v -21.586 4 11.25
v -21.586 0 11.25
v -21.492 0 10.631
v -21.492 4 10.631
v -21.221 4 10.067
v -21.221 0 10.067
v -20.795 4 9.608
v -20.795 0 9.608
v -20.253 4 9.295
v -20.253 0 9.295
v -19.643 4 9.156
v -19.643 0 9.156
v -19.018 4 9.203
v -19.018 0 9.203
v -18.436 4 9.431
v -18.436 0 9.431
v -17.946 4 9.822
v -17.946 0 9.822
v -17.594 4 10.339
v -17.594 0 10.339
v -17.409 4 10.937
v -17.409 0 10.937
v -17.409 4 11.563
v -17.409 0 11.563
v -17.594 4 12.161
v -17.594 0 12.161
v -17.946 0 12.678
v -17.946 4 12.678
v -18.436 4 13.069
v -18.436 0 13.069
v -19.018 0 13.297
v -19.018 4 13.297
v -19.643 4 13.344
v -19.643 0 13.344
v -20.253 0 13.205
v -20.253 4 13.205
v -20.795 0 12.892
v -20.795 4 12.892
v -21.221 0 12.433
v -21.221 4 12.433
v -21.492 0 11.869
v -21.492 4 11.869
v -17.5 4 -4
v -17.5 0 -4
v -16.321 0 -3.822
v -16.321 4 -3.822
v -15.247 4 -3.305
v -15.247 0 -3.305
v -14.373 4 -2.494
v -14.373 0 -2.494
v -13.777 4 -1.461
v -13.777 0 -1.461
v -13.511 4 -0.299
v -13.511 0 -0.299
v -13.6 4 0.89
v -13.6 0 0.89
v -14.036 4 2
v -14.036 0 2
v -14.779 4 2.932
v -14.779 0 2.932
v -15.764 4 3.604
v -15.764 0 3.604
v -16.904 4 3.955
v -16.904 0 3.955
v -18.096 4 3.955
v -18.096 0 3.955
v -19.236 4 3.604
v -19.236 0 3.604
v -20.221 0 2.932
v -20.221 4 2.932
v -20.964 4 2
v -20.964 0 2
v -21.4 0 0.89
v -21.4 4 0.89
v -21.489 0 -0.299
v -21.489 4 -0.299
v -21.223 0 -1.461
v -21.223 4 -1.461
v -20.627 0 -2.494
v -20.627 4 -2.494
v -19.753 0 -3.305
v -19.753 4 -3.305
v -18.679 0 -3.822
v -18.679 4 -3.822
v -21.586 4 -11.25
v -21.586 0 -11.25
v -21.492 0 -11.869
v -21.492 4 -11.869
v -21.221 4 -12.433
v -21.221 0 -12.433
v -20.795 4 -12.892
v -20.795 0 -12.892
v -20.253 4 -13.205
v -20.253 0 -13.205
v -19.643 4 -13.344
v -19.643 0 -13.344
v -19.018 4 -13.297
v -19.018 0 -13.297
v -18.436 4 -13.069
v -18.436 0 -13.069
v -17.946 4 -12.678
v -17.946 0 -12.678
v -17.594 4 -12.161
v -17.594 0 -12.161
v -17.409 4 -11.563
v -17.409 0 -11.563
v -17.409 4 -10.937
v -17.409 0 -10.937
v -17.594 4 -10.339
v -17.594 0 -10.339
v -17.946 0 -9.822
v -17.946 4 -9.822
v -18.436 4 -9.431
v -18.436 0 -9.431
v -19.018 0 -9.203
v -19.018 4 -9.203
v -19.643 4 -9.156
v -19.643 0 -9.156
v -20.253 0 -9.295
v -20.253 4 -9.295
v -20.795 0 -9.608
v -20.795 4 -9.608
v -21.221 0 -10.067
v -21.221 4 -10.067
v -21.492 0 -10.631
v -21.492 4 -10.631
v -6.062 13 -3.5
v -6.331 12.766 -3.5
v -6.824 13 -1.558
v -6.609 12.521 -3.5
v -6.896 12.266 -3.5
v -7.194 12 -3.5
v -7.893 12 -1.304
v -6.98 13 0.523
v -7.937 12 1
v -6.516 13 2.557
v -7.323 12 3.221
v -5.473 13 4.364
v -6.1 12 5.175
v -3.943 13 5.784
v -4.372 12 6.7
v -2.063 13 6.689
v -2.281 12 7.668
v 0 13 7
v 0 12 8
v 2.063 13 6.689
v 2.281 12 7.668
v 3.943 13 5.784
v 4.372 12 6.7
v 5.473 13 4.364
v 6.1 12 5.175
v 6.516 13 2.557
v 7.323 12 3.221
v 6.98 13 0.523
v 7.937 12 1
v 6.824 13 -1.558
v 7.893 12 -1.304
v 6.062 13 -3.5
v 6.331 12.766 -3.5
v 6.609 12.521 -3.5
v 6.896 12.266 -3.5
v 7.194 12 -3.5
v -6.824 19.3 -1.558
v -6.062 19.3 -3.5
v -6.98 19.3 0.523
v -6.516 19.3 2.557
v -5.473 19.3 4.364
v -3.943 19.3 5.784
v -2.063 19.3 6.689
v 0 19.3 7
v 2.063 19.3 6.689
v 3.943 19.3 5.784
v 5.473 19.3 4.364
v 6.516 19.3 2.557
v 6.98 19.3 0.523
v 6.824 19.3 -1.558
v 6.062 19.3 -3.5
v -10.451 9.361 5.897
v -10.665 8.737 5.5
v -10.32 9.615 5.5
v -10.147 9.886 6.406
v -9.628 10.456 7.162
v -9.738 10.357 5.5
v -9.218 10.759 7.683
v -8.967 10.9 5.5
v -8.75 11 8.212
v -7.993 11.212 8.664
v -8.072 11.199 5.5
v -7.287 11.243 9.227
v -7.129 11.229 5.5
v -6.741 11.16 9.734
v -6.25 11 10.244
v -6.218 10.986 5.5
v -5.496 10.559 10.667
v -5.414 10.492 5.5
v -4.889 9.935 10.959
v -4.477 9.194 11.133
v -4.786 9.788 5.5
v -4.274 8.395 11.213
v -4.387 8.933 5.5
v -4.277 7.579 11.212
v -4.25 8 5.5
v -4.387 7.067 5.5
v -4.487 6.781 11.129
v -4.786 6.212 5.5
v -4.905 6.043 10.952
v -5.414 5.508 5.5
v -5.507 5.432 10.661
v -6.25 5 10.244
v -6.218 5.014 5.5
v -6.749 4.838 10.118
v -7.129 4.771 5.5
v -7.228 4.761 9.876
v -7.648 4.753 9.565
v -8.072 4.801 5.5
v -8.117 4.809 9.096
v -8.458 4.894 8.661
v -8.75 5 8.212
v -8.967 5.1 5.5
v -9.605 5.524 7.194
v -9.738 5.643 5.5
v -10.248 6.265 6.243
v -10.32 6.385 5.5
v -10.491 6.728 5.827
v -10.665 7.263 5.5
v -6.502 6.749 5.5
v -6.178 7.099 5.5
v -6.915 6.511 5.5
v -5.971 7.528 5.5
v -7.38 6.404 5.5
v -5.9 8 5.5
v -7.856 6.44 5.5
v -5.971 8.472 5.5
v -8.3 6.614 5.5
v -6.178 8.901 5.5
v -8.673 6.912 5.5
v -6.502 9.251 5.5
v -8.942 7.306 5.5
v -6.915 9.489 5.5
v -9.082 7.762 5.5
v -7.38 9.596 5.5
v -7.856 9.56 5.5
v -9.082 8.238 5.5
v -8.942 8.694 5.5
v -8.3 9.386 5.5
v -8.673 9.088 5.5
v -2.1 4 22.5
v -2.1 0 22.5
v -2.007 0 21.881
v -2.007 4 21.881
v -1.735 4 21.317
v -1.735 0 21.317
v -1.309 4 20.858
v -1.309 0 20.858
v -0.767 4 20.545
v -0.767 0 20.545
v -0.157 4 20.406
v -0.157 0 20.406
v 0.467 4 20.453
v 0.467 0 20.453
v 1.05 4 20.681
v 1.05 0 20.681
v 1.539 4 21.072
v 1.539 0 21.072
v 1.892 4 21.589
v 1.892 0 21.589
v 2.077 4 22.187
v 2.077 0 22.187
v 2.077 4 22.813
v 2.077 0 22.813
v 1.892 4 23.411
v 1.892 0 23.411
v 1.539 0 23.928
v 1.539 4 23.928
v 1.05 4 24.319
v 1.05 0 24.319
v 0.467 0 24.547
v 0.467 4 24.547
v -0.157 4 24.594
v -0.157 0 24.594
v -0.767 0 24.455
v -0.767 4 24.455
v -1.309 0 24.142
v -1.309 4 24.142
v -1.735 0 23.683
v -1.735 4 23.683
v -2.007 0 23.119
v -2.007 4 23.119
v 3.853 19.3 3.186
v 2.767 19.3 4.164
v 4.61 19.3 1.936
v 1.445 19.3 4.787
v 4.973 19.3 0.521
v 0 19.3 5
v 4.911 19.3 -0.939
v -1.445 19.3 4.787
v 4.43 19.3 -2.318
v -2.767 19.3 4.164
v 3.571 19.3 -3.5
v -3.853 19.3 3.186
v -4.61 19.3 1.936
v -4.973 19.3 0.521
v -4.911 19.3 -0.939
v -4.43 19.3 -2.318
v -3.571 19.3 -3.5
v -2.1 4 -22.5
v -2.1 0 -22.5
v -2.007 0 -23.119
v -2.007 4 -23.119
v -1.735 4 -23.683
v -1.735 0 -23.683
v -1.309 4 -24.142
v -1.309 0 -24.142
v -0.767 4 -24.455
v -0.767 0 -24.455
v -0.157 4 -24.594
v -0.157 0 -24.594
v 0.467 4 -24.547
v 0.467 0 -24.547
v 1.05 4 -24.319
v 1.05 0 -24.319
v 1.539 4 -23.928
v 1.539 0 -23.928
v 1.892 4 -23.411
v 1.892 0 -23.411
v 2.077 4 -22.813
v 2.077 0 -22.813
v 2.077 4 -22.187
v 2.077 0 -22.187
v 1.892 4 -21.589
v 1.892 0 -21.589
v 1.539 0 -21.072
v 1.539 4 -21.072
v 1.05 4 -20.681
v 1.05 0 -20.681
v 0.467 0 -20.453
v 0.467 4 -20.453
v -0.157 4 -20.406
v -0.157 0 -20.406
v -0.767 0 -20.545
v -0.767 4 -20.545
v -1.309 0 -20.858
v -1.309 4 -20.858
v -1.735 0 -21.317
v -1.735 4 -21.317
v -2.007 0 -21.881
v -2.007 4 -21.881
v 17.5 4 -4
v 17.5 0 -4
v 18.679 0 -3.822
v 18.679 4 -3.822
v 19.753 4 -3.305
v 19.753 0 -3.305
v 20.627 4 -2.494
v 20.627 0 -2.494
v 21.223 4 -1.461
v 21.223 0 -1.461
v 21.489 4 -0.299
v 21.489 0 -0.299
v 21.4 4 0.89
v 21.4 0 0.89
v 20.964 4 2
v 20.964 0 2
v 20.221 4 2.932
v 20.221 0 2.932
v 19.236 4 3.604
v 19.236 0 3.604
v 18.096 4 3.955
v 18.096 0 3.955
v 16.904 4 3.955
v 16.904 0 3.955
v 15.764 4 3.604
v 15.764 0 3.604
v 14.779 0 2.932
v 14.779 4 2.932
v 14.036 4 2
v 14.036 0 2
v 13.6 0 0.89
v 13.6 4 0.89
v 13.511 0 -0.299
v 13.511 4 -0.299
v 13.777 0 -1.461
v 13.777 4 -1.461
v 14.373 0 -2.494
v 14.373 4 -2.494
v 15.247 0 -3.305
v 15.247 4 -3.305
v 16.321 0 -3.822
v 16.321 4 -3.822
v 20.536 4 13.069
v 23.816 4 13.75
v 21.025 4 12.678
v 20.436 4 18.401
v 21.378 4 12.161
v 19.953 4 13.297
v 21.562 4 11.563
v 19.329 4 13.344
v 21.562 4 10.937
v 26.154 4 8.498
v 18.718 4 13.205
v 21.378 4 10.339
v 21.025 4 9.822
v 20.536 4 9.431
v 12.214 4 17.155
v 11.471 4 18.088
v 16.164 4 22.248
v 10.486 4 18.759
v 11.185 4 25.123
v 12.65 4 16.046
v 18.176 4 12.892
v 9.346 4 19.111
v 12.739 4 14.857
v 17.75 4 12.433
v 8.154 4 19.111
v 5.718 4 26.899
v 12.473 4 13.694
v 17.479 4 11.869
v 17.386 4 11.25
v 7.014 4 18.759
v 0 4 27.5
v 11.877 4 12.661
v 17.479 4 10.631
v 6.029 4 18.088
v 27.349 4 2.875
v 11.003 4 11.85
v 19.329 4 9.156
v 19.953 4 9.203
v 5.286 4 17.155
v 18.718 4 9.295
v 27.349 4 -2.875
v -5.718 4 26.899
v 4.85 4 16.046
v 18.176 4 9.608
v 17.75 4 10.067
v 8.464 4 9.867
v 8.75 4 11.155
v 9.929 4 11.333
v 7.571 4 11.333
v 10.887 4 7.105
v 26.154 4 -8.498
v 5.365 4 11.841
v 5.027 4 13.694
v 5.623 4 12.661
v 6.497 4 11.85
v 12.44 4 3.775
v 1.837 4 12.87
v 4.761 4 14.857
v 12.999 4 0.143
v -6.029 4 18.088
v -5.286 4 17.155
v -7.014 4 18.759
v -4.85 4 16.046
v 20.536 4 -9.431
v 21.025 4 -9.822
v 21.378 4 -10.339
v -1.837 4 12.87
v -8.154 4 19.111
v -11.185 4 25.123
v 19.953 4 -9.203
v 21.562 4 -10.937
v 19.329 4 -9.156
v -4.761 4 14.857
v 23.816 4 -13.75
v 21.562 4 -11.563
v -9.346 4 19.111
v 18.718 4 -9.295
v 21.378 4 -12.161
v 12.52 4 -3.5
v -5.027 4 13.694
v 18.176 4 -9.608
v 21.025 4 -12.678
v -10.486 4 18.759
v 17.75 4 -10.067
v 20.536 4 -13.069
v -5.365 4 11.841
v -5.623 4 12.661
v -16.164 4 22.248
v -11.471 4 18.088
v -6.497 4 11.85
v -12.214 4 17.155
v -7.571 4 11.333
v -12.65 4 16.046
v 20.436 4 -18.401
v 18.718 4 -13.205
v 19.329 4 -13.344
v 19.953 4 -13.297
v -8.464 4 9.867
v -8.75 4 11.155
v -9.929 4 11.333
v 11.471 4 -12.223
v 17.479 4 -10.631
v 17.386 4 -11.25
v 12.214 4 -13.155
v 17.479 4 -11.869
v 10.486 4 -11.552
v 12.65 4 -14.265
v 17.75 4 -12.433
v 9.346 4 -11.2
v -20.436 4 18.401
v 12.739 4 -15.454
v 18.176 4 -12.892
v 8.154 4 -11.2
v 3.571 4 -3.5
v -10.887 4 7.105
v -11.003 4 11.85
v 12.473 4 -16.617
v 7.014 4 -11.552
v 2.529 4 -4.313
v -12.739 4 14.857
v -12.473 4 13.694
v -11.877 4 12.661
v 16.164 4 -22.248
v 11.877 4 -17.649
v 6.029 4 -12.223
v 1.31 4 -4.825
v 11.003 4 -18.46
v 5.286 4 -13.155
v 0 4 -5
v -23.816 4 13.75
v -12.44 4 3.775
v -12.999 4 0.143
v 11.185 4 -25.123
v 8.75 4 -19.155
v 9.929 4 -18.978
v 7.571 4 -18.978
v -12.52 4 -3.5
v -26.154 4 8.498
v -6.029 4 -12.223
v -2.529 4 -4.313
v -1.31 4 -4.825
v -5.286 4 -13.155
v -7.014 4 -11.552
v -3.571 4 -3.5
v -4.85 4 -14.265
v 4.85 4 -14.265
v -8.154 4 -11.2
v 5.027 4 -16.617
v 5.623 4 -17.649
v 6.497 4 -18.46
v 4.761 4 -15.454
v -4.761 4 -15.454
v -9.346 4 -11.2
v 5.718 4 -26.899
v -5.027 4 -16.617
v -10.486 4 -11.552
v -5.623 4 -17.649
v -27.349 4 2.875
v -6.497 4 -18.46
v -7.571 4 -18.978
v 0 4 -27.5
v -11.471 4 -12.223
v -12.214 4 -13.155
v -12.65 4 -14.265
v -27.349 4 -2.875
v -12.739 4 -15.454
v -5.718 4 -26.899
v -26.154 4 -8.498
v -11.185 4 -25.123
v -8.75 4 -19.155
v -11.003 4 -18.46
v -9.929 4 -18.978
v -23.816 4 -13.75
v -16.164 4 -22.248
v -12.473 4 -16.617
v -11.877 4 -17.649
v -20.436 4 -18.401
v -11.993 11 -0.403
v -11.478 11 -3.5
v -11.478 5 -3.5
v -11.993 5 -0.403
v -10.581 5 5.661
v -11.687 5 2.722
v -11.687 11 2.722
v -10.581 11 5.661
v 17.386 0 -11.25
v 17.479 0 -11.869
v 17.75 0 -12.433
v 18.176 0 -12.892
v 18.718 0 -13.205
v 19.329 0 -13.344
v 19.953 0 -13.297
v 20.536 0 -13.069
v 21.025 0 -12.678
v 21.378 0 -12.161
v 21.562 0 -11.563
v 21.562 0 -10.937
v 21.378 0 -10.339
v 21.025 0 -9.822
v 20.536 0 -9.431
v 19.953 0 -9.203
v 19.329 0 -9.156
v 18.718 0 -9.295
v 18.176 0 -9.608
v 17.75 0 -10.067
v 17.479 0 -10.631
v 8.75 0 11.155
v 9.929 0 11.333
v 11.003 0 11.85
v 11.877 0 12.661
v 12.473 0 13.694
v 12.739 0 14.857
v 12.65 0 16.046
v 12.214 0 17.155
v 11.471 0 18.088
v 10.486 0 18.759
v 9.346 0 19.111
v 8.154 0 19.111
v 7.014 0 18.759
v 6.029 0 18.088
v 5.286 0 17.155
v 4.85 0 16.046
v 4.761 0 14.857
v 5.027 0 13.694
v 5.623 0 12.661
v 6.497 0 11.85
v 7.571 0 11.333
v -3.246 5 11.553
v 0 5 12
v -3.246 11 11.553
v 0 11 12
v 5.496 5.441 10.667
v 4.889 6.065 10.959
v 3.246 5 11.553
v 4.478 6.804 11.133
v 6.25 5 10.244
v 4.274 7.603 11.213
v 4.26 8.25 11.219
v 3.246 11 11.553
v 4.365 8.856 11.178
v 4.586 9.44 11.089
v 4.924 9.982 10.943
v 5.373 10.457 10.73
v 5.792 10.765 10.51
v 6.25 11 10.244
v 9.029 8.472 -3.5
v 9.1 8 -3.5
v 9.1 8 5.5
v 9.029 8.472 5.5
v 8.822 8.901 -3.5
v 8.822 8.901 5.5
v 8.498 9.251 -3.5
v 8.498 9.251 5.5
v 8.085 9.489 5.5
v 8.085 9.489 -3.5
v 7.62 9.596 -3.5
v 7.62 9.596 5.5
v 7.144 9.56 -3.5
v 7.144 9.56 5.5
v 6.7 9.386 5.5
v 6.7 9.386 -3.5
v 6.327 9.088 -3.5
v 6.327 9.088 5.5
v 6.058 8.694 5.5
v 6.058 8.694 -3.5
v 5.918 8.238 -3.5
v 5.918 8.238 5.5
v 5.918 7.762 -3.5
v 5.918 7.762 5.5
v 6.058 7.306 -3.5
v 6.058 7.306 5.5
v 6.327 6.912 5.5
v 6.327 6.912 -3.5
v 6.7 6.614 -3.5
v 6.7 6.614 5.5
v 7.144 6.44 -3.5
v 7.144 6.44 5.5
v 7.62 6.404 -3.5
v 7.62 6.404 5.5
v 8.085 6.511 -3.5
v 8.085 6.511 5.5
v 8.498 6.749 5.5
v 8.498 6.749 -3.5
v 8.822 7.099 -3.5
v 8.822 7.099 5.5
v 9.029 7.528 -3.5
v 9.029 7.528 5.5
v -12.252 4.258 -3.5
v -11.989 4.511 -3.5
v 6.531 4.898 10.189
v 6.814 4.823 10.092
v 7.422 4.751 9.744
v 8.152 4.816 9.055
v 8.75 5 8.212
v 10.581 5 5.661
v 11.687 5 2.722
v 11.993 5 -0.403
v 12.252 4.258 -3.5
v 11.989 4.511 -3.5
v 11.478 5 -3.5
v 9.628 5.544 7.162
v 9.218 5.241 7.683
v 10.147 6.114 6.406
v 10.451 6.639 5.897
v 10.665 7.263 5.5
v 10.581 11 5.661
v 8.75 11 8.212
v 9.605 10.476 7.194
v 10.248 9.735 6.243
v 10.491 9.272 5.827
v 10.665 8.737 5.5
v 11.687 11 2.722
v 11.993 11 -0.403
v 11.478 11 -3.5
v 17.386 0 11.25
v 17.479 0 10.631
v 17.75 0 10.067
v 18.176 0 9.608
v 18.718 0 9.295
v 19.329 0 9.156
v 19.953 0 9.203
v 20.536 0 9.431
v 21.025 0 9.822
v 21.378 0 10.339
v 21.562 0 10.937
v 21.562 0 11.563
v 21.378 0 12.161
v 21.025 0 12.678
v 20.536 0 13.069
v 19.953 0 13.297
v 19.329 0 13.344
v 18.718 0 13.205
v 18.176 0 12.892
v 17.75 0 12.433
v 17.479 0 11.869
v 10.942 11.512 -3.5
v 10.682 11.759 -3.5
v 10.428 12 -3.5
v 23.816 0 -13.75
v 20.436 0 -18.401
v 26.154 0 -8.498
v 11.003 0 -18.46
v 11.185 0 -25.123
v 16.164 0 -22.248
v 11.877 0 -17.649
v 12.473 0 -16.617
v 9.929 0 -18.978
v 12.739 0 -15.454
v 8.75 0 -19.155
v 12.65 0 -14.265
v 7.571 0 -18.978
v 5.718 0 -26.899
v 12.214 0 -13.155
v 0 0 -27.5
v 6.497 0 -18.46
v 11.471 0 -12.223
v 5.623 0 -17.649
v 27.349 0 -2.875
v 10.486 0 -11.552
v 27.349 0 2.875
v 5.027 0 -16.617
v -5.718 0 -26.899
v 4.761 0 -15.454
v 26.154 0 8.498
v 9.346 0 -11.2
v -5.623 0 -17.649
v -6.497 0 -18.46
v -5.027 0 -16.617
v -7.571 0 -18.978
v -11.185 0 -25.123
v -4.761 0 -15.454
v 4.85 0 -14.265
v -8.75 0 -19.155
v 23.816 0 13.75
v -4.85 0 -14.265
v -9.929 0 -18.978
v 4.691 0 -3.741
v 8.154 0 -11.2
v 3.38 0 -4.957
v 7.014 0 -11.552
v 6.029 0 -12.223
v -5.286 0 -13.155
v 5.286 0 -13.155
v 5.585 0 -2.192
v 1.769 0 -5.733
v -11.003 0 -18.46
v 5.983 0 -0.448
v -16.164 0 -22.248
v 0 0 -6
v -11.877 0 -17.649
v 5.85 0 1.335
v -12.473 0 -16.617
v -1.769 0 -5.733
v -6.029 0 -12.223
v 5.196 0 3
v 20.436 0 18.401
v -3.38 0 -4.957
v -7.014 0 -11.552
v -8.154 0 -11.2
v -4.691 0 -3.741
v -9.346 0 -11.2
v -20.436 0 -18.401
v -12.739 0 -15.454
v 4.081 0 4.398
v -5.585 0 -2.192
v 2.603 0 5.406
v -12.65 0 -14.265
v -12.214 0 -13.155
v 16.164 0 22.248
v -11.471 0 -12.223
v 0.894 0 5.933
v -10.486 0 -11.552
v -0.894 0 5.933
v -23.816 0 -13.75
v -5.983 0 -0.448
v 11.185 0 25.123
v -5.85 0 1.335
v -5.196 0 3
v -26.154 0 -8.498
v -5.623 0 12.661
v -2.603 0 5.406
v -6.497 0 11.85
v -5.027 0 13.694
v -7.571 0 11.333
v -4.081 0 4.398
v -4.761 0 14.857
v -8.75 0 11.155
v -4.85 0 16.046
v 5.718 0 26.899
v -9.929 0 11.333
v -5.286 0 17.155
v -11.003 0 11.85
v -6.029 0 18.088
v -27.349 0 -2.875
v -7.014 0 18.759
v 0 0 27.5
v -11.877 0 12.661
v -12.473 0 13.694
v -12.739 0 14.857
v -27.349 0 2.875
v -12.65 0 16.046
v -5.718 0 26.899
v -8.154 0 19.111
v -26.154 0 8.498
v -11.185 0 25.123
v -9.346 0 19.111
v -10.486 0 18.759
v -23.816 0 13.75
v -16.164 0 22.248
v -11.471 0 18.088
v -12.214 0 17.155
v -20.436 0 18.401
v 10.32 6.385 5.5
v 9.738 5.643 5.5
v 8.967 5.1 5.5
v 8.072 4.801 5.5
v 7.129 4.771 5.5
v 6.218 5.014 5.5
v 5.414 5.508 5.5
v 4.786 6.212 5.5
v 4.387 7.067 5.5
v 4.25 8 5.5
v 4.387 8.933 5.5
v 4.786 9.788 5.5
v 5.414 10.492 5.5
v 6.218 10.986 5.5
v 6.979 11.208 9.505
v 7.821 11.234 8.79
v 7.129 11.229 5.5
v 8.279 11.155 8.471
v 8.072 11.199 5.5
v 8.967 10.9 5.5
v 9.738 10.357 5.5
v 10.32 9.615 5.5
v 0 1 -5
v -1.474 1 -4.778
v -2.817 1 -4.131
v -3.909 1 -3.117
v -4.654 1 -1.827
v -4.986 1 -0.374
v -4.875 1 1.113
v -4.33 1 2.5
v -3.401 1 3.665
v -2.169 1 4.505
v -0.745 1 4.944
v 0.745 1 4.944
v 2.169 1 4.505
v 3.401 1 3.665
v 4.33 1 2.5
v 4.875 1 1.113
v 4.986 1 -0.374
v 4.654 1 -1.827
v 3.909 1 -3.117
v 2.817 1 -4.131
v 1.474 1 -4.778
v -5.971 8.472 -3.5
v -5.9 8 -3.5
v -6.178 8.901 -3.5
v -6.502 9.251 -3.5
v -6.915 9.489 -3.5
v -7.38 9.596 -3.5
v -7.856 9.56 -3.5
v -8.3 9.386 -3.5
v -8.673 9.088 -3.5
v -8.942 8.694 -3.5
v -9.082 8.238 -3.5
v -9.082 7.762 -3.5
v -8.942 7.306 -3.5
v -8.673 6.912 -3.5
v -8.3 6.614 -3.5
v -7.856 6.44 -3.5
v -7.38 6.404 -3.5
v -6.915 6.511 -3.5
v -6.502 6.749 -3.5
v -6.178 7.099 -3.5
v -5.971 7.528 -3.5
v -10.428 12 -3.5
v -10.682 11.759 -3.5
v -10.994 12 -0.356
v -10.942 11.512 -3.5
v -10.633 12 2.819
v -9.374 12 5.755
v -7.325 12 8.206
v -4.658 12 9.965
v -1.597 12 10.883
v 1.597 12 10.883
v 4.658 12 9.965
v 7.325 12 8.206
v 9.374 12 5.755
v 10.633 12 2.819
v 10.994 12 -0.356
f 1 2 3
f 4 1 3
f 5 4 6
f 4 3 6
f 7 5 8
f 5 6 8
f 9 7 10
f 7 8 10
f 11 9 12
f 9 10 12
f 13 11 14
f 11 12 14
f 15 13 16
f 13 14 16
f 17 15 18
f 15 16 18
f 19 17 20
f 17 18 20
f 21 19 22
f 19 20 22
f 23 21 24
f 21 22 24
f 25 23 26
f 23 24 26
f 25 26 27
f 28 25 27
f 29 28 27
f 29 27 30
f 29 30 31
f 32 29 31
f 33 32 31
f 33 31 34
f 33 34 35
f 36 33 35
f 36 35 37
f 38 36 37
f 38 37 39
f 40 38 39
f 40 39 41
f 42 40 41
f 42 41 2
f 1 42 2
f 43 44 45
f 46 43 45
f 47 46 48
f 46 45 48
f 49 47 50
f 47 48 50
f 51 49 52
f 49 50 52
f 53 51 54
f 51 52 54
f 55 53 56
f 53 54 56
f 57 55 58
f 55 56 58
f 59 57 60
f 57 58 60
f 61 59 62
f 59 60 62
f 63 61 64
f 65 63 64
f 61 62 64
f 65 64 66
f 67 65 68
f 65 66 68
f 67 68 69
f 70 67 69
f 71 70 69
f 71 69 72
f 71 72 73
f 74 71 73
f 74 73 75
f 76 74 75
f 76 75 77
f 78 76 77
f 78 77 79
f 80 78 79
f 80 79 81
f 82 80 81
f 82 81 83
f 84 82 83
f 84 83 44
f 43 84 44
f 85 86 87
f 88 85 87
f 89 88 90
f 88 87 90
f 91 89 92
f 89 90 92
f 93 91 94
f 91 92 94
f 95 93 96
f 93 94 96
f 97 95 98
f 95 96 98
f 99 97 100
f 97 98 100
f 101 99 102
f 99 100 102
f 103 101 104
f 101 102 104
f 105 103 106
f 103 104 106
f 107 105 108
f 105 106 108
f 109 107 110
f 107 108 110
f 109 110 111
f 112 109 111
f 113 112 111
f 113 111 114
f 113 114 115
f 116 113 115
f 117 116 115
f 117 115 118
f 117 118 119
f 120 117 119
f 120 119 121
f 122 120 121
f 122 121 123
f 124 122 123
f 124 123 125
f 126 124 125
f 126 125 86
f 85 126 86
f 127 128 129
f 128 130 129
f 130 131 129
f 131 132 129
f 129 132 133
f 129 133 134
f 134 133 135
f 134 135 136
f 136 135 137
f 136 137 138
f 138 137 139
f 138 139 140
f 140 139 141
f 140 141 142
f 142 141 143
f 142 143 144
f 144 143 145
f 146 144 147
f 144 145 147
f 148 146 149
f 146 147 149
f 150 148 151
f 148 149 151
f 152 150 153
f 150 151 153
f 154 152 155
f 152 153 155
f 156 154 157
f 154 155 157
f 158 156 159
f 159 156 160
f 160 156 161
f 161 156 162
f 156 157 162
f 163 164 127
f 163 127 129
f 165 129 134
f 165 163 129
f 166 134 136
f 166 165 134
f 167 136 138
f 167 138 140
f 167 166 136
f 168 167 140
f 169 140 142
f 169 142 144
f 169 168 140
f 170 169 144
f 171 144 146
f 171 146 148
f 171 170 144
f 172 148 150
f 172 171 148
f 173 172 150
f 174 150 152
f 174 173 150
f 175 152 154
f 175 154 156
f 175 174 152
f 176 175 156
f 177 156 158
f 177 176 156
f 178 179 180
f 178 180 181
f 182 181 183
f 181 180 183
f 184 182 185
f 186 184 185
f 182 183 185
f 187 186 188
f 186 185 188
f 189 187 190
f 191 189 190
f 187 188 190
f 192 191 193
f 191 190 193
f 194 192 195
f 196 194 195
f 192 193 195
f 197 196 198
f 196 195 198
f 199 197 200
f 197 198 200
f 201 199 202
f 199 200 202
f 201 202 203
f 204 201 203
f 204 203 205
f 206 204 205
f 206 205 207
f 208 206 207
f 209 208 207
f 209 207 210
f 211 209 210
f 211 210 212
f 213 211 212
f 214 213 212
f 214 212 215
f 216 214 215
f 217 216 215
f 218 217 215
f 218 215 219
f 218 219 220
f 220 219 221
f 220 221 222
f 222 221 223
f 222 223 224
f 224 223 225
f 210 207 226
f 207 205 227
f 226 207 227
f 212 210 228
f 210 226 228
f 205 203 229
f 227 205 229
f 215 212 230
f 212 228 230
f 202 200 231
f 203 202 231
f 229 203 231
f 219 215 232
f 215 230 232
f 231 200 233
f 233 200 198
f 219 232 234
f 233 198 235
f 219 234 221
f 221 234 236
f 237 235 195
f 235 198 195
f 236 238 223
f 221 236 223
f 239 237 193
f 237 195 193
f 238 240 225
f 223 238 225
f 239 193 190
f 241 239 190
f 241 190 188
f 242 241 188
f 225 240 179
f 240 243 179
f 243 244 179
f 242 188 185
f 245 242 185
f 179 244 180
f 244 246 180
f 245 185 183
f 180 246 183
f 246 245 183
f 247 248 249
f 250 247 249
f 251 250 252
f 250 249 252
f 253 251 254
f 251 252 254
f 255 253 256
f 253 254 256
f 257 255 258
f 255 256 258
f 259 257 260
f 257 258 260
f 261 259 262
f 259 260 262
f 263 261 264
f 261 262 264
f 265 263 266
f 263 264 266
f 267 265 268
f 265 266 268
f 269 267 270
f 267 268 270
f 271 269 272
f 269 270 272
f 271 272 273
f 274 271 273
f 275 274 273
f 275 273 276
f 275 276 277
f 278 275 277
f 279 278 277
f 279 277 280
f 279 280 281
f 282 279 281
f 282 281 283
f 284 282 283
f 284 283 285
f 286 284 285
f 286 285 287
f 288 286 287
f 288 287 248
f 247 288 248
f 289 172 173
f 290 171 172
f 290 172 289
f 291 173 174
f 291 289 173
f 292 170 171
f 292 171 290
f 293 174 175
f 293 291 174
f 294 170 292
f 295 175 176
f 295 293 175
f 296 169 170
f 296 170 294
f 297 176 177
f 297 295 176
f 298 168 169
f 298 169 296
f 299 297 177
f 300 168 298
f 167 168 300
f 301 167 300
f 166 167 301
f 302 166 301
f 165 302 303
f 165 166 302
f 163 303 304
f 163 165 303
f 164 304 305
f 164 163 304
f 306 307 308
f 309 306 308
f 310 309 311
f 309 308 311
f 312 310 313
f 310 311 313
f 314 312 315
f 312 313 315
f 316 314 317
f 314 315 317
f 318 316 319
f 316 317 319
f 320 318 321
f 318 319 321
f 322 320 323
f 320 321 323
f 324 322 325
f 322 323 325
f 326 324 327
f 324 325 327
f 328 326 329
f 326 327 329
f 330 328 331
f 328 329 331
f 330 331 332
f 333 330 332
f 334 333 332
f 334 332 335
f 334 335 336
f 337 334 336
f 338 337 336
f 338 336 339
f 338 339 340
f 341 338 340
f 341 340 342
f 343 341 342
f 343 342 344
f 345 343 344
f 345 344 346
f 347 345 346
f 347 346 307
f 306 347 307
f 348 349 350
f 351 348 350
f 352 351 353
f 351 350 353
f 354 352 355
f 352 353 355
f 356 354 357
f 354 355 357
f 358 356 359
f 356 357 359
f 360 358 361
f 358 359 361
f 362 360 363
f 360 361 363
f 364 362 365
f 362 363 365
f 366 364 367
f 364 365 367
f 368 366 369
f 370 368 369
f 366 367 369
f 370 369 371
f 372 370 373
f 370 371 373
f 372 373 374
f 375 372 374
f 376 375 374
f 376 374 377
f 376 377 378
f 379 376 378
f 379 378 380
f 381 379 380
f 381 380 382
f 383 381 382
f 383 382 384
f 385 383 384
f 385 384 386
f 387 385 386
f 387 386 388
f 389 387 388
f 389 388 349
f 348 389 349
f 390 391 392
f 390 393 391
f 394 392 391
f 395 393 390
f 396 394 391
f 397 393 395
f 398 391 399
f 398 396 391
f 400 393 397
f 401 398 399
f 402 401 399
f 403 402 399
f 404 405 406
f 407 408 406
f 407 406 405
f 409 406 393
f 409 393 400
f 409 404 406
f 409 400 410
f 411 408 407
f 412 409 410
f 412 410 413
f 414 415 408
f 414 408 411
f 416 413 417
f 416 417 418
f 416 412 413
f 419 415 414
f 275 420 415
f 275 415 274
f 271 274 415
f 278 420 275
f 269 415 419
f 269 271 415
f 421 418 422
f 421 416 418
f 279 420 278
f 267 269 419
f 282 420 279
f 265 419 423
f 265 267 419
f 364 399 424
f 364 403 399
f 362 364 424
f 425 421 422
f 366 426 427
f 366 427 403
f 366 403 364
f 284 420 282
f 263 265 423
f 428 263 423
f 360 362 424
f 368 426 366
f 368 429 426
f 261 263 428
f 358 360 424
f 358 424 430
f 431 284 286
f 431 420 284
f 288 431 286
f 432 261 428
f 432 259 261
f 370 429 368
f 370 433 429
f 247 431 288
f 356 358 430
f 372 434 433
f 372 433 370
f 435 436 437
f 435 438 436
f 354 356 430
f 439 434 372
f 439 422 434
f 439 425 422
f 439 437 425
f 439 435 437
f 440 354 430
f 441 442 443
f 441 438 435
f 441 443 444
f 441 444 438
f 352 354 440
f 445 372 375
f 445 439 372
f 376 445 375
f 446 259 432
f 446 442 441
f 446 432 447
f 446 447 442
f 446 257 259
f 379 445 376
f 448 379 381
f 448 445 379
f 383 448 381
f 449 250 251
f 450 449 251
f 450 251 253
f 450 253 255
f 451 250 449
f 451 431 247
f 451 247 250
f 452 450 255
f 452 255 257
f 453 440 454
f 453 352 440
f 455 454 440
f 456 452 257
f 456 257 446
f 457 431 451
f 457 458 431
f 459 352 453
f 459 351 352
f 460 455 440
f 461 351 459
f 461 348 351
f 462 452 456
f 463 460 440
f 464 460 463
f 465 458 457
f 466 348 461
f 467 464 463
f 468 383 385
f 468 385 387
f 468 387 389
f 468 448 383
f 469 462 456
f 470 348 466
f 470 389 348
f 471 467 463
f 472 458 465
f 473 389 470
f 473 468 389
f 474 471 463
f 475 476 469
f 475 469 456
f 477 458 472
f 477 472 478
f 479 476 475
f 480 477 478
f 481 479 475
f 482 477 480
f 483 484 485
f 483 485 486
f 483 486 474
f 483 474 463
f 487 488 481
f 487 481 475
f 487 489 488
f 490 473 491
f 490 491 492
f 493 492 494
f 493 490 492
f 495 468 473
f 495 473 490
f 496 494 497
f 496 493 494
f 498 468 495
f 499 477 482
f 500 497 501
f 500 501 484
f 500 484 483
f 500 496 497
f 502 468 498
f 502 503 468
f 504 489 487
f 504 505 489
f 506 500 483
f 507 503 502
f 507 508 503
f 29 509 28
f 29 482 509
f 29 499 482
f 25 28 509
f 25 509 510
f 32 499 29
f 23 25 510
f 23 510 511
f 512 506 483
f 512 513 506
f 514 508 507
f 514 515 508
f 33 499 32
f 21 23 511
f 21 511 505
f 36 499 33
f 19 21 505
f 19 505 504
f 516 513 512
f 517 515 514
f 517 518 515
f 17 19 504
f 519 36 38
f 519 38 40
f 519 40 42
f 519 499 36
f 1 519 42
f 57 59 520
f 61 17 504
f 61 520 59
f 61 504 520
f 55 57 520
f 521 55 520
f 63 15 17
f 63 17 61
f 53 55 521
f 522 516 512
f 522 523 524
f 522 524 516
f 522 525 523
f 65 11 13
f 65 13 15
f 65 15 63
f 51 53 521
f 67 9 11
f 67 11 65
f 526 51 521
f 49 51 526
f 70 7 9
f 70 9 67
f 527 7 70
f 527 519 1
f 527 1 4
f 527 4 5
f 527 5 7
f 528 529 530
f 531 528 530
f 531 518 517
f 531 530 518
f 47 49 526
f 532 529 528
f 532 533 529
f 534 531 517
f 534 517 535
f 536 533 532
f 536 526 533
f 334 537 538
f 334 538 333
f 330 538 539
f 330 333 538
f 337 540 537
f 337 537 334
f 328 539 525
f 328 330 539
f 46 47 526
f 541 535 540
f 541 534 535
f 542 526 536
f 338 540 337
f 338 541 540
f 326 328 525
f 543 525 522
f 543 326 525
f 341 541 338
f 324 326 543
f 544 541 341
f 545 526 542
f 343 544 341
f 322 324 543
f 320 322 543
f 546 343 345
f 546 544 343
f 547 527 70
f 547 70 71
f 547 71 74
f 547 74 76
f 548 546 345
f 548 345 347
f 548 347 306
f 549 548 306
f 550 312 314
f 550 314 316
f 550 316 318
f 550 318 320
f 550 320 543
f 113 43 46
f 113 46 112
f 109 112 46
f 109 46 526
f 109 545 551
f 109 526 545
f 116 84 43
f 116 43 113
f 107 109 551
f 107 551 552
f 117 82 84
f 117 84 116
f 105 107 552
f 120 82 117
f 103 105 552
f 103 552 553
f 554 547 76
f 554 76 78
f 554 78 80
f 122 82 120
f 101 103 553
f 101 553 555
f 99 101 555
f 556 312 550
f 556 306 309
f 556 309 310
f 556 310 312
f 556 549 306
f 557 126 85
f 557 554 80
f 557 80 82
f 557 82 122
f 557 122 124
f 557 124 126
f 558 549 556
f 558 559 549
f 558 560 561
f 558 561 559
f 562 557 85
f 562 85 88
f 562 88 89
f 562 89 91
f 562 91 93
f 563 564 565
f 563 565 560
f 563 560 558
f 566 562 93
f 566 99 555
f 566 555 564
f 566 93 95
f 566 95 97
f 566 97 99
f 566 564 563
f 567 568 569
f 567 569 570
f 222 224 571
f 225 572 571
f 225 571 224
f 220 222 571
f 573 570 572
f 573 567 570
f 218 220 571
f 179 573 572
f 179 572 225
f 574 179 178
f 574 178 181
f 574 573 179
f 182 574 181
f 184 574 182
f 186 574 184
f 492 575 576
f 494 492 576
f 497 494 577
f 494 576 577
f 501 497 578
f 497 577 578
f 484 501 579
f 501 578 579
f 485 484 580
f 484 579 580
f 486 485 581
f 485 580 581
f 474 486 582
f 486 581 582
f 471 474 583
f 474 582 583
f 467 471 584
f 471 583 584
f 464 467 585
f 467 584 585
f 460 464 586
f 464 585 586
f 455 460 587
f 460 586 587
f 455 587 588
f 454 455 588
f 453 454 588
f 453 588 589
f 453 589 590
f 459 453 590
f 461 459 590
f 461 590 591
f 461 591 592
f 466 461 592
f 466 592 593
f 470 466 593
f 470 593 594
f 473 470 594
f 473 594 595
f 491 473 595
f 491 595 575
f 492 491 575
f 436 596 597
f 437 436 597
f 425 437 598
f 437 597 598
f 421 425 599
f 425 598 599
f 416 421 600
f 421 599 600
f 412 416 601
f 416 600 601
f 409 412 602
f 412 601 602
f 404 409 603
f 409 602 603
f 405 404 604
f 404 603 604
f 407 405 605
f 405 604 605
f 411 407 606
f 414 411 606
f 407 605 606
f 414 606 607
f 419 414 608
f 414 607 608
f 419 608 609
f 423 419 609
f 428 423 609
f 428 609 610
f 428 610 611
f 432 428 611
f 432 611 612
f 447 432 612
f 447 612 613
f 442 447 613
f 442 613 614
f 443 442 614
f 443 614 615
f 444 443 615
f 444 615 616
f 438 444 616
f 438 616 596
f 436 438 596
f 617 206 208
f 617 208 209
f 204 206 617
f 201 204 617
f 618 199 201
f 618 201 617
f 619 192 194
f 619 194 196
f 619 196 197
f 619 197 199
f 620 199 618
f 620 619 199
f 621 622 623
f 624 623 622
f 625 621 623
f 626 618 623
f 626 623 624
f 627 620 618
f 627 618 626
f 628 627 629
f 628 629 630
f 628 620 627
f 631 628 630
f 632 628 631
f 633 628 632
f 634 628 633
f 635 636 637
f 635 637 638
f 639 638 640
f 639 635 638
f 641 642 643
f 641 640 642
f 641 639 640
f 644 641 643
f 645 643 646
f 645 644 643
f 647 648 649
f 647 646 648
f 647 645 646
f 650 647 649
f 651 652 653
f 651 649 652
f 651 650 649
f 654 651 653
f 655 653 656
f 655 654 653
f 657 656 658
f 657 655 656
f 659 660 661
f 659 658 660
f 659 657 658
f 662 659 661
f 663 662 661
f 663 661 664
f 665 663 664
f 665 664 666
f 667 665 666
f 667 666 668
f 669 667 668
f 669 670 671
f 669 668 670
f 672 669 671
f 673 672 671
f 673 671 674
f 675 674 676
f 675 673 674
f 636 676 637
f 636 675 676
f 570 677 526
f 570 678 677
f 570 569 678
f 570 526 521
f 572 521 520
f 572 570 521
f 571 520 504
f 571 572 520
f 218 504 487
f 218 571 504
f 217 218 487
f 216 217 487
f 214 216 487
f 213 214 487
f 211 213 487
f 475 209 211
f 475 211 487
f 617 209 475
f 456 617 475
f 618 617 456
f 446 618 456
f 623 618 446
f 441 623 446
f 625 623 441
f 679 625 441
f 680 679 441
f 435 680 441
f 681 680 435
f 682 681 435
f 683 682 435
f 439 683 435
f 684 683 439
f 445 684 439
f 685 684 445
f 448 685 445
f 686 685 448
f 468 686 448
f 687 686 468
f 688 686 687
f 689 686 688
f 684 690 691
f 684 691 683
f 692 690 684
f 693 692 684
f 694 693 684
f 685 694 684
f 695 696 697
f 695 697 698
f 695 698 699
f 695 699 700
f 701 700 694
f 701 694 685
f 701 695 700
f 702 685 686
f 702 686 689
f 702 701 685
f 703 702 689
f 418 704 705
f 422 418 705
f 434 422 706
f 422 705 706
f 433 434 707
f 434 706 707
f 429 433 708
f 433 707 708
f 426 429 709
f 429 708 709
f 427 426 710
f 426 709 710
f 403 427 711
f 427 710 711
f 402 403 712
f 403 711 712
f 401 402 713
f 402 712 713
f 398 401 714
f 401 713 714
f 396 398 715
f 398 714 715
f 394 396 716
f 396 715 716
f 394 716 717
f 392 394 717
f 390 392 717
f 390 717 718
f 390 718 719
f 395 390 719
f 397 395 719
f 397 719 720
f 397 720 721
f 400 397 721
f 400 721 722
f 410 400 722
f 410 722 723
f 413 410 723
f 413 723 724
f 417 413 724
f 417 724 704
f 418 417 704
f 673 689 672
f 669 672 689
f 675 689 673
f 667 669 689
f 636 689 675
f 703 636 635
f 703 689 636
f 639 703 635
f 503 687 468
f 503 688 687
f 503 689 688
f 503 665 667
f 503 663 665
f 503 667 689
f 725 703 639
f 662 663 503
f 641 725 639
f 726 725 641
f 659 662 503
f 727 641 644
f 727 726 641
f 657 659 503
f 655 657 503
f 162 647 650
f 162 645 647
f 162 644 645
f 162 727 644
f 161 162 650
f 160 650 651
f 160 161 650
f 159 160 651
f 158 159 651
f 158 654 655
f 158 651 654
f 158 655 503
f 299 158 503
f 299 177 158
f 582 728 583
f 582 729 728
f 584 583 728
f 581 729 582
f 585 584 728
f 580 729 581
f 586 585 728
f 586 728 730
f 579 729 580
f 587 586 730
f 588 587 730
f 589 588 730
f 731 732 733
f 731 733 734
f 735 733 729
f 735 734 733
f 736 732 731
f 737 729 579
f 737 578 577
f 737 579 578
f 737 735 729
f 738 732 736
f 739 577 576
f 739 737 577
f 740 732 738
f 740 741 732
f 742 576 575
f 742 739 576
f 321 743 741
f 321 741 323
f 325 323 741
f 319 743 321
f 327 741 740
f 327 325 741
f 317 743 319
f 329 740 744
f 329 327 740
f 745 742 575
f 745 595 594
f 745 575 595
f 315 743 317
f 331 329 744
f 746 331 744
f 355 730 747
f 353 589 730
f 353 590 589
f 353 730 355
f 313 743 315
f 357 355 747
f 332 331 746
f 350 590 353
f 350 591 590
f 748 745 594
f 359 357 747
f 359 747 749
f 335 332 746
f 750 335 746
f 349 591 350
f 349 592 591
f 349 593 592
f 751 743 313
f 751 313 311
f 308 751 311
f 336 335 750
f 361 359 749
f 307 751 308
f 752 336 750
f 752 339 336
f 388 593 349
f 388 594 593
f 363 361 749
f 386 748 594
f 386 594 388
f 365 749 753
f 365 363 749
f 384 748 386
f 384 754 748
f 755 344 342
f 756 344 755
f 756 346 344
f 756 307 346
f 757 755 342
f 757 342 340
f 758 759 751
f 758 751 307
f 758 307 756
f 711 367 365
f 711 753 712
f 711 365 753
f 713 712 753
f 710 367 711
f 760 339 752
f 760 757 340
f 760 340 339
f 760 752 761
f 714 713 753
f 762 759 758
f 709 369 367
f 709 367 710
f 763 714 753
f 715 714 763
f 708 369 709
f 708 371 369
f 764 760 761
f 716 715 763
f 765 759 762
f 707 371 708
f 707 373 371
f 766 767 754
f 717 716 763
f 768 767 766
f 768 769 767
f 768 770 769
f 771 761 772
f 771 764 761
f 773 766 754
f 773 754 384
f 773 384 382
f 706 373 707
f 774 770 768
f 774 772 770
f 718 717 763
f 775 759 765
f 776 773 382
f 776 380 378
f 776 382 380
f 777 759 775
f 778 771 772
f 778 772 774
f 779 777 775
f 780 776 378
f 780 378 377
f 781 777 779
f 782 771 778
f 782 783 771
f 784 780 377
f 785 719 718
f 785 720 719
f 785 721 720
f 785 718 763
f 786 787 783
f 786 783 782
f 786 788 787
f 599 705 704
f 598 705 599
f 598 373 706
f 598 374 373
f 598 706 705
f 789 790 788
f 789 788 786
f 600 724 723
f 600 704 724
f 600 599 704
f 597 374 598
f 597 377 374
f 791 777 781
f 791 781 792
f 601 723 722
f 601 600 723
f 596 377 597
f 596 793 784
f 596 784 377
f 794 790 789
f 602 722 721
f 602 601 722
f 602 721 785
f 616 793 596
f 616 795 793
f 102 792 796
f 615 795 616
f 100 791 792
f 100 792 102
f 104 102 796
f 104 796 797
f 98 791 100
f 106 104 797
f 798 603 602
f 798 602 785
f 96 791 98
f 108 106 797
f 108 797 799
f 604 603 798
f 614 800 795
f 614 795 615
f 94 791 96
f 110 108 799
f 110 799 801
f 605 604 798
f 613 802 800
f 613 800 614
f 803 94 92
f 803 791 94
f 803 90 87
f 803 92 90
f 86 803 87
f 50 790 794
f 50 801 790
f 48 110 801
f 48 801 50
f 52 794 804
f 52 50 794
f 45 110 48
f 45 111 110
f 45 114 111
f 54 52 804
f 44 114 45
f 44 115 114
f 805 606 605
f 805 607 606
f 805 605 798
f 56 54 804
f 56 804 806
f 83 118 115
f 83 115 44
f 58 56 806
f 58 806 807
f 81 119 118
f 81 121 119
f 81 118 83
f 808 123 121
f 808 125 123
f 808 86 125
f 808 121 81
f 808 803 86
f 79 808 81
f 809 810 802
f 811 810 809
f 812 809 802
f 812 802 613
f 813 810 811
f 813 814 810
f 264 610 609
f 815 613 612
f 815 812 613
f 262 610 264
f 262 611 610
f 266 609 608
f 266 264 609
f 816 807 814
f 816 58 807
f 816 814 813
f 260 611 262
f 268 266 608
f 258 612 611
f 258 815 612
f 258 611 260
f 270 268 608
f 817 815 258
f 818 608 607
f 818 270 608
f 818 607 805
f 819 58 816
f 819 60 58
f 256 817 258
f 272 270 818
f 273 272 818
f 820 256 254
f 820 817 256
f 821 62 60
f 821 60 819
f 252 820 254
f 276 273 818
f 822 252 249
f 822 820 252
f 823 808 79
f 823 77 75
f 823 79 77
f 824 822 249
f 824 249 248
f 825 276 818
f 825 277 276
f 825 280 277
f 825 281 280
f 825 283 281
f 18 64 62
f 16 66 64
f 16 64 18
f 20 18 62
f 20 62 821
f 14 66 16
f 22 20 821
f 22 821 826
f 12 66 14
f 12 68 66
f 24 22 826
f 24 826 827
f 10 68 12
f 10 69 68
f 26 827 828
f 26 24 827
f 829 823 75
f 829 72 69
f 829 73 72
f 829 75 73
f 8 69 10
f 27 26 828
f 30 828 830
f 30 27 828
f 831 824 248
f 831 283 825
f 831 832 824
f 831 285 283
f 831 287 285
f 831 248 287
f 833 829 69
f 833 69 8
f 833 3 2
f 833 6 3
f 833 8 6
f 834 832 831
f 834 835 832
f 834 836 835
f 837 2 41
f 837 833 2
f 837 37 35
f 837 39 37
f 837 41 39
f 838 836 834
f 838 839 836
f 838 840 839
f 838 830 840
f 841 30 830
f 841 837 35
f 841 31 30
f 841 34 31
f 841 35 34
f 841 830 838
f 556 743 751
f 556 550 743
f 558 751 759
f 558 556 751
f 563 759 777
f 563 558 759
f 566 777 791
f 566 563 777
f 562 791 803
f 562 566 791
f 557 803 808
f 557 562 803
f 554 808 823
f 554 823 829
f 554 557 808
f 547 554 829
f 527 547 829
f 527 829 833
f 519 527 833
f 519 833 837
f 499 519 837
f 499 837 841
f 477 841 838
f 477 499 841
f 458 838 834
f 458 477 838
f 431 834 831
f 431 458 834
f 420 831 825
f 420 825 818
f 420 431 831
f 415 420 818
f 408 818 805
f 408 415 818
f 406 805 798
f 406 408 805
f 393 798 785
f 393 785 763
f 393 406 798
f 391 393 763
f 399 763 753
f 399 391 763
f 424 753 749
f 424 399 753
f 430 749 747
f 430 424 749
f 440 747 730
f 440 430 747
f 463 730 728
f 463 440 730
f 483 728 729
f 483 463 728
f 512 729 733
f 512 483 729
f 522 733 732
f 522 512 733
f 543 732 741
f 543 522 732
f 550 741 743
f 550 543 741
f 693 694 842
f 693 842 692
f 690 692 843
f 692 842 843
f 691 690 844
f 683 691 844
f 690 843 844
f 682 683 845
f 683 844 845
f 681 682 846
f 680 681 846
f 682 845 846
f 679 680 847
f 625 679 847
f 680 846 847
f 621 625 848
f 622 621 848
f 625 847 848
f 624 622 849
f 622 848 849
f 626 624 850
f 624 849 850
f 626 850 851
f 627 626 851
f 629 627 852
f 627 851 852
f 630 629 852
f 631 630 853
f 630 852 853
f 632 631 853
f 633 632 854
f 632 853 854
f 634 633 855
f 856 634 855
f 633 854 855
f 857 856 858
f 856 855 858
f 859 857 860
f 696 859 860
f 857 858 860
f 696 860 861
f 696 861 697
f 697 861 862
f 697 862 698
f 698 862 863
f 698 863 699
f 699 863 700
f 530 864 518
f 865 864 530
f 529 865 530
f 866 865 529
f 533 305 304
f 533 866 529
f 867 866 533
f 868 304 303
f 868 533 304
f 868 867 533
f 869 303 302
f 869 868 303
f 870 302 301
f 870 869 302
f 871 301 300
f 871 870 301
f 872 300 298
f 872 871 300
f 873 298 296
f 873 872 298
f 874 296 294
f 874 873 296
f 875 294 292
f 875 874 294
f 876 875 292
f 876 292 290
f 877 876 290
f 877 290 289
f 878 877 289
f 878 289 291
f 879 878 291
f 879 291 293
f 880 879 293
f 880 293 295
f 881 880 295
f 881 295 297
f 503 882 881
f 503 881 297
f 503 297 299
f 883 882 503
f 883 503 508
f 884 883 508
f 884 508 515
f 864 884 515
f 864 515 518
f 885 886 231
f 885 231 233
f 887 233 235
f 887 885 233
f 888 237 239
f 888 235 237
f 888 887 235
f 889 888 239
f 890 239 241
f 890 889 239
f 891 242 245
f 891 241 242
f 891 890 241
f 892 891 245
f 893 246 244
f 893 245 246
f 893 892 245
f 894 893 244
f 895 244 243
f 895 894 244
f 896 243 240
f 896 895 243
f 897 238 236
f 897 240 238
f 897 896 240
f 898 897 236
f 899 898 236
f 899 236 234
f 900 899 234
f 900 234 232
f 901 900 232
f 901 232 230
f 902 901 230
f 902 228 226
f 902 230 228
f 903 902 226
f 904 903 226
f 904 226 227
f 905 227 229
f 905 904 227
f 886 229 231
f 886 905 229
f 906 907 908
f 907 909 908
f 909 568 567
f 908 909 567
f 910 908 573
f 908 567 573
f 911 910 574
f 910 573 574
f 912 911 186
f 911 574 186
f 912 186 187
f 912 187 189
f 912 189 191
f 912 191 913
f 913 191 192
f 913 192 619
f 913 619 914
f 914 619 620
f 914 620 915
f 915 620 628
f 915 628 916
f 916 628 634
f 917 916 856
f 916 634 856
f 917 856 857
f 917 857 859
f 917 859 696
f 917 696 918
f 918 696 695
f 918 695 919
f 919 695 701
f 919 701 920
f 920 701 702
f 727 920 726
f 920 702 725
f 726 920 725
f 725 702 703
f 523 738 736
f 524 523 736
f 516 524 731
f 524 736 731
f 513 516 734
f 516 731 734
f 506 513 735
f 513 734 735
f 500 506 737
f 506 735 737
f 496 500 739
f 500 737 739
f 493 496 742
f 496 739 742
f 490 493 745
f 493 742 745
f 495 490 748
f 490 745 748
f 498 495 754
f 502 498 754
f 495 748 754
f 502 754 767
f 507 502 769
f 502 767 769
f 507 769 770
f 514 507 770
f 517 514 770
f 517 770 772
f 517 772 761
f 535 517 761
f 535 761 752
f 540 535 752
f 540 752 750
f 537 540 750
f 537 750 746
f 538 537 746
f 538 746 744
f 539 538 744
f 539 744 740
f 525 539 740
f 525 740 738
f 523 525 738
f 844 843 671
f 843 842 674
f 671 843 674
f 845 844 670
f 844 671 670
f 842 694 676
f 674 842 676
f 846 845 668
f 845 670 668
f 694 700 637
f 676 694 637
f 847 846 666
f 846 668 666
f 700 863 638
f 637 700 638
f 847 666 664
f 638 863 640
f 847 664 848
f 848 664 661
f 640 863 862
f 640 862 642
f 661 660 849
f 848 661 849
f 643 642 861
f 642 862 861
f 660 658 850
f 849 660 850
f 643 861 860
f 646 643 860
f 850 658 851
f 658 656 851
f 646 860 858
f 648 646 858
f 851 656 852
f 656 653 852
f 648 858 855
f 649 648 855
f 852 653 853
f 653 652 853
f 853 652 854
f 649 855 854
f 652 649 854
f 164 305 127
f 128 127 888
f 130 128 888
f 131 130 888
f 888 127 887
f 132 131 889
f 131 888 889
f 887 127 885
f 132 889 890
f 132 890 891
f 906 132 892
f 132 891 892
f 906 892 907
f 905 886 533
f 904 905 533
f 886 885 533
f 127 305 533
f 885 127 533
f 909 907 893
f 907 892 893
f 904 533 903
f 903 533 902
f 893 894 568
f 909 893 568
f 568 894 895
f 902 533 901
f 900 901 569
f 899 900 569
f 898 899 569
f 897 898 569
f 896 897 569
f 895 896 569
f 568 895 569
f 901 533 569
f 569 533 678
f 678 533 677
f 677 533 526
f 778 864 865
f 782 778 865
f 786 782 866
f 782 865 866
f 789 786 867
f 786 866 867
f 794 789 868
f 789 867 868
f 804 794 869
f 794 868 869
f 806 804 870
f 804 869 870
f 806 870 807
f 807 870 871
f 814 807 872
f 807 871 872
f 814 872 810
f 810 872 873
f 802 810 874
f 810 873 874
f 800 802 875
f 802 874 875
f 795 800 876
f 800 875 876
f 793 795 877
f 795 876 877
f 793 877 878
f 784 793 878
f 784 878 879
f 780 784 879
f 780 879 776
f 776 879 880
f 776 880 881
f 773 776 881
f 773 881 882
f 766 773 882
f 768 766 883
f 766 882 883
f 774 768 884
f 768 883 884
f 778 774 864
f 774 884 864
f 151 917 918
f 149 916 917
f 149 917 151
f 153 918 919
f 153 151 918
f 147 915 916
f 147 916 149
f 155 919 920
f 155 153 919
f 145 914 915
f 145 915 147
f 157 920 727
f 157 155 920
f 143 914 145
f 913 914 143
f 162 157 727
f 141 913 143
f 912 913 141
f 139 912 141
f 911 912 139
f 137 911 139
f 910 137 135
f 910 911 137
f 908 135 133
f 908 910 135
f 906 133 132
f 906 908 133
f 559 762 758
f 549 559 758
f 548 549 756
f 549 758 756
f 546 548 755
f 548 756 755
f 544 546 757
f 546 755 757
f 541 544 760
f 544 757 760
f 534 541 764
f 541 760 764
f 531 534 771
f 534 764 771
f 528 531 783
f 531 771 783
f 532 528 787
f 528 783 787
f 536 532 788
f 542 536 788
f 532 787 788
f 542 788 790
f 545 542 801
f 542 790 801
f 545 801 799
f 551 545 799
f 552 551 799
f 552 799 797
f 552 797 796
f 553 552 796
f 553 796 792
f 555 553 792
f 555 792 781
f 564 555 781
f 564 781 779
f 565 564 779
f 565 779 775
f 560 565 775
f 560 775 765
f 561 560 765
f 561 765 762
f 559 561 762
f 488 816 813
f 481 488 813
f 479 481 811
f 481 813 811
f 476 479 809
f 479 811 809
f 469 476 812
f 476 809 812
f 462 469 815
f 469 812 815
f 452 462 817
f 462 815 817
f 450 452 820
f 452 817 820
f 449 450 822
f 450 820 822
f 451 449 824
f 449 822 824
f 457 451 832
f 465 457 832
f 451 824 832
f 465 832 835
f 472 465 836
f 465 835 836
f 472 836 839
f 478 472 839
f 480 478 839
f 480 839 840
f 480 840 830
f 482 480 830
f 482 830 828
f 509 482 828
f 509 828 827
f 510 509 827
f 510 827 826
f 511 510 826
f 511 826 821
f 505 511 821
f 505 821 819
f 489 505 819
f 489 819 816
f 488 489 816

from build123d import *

# Parameters (mm, degrees)
SKETCH_2_R                      = 4
CUT_EXTRUDE_2_DEPTH             = 10
CUT_EXTRUDE_4_REACH             = 42.7
CUT_EXTRUDE_4_DIRECTION_2_DEPTH = 41.70012285
CHAMFER_1_SIZE                  = 1
CUT_EXTRUDE_3_DEPTH             = 44.416471529
CUT_EXTRUDE_3_DEPTH_BACK        = 44.416471529
SKETCH_3_R                      = 1.6
SKETCH_7_R                      = 3.25
CUT_EXTRUDE_5_DEPTH             = 48.092886936
HOLE_WIZARD_M5_1_D              = 4.2


with BuildPart() as part:
    # 草图1 → 旋转1 (revolve)
    with BuildSketch(Plane.XY, mode=Mode.PRIVATE) as revolve_1_sk:
        Polygon((-5, 0), (-27.5, 0), (-27.5, 4), (-12, 4), (-12, 12), (-7, 12), (-7, 19.3), (-5, 19.3), align=None)
    revolve(revolve_1_sk.sketch.rotate(Axis((0, 0, 0), (0, 1, 0)), 270), axis=Axis((0, 0, 0), (0, 1, 0)))

    # 草图2 → 切除-拉伸2 (cut)
    with BuildSketch(Plane.XZ):
        with Locations(Location((-8.75, -15.155444566, 0), (0, 0, 270))):
            Circle(SKETCH_2_R)
        with Locations(Location((-8.75, 15.155444566, 0), (0, 0, 270))):
            Circle(SKETCH_2_R)
        with Locations(Location((8.75, 15.155444566, 0), (0, 0, 270))):
            Circle(SKETCH_2_R)
        with Locations(Location((17.5, 0, 0), (0, 0, 270))):
            Circle(SKETCH_2_R)
        with Locations(Location((8.75, -15.155444566, 0), (0, 0, 270))):
            Circle(SKETCH_2_R)
        with Locations(Location((-17.5, 0, 0), (0, 0, 270))):
            Circle(SKETCH_2_R)
    extrude(amount=-CUT_EXTRUDE_2_DEPTH, mode=Mode.SUBTRACT)

    # 切除-拉伸4: up to this face of the body (flat: up to its plane)
    cut_extrude_4_end = Plane(part.part.faces().sort_by_distance((0, 4, 26.722182541))[0])
    # 草图6 → 切除-拉伸4 (cut, up to the picked face)
    with BuildSketch(Plane.XZ.offset(-12), mode=Mode.PRIVATE) as cut_extrude_4_sk1:
        with BuildLine():
            Line((11.478240283, -3.5), (-11.478240283, -3.5))
            ThreePointArc((-11.478240283, -3.5), (0, -12), (11.478240283, -3.5))
        make_face()
    cut_extrude_4_tool1 = split(extrude(cut_extrude_4_sk1.sketch, amount=CUT_EXTRUDE_4_REACH, mode=Mode.PRIVATE), bisect_by=cut_extrude_4_end, keep=Keep.BOTH, mode=Mode.PRIVATE)
    add(cut_extrude_4_tool1.solids().sort_by(Axis((0, 12, -7.030424), (0, -1, 0)))[0], mode=Mode.SUBTRACT)

    # 草图6 → 切除-拉伸4 direction 2 (cut)
    with BuildSketch(Plane.XZ.offset(-12)):
        with BuildLine():
            Line((11.478240283, -3.5), (-11.478240283, -3.5))
            ThreePointArc((-11.478240283, -3.5), (0, -12), (11.478240283, -3.5))
        make_face()
    extrude(amount=-CUT_EXTRUDE_4_DIRECTION_2_DEPTH, mode=Mode.SUBTRACT)

    # 倒角1
    chamfer_1_edges = [part.edges().sort_by_distance(p)[0] for p in [
        (0, 12, 7),
        (0, 12, 12),
        (0, 4, 12),
        (0, 0, 5),
    ]]
    chamfer(chamfer_1_edges, length=CHAMFER_1_SIZE)

    # 草图3 → 切除-拉伸3 (cut, two sides: drawn at the far end of the back side and taken through both)
    with BuildSketch(Plane.XY.offset(-CUT_EXTRUDE_3_DEPTH_BACK)):
        with Locations((7.5, 8)):
            Circle(SKETCH_3_R)
        with Locations((-7.5, 8)):
            Circle(SKETCH_3_R)
    extrude(amount=CUT_EXTRUDE_3_DEPTH + CUT_EXTRUDE_3_DEPTH_BACK, mode=Mode.SUBTRACT)

    # 草图7 → 切除-拉伸5 (cut, through all)
    with BuildSketch(Plane(origin=(0, 0, 5.5), x_dir=(-1, 0, 0), z_dir=(0, 0, -1))):
        with Locations((-7.5, 8)):
            Circle(SKETCH_7_R)
        with Locations((7.5, 8)):
            Circle(SKETCH_7_R)
    extrude(amount=-CUT_EXTRUDE_5_DEPTH, mode=Mode.SUBTRACT)

    # M5 螺纹孔1 (through all)
    with Locations(Plane(origin=(0, 4, 0), x_dir=(1, 0, 0), z_dir=(0, 1, 0))):
        with Locations((0, 22.5), (19.485571585, 11.25), (19.485571585, -11.25), (0, -22.5), (-19.485571585, -11.25), (-19.485571585, 11.25)):
            Hole(HOLE_WIZARD_M5_1_D / 2)


solid = part.part
